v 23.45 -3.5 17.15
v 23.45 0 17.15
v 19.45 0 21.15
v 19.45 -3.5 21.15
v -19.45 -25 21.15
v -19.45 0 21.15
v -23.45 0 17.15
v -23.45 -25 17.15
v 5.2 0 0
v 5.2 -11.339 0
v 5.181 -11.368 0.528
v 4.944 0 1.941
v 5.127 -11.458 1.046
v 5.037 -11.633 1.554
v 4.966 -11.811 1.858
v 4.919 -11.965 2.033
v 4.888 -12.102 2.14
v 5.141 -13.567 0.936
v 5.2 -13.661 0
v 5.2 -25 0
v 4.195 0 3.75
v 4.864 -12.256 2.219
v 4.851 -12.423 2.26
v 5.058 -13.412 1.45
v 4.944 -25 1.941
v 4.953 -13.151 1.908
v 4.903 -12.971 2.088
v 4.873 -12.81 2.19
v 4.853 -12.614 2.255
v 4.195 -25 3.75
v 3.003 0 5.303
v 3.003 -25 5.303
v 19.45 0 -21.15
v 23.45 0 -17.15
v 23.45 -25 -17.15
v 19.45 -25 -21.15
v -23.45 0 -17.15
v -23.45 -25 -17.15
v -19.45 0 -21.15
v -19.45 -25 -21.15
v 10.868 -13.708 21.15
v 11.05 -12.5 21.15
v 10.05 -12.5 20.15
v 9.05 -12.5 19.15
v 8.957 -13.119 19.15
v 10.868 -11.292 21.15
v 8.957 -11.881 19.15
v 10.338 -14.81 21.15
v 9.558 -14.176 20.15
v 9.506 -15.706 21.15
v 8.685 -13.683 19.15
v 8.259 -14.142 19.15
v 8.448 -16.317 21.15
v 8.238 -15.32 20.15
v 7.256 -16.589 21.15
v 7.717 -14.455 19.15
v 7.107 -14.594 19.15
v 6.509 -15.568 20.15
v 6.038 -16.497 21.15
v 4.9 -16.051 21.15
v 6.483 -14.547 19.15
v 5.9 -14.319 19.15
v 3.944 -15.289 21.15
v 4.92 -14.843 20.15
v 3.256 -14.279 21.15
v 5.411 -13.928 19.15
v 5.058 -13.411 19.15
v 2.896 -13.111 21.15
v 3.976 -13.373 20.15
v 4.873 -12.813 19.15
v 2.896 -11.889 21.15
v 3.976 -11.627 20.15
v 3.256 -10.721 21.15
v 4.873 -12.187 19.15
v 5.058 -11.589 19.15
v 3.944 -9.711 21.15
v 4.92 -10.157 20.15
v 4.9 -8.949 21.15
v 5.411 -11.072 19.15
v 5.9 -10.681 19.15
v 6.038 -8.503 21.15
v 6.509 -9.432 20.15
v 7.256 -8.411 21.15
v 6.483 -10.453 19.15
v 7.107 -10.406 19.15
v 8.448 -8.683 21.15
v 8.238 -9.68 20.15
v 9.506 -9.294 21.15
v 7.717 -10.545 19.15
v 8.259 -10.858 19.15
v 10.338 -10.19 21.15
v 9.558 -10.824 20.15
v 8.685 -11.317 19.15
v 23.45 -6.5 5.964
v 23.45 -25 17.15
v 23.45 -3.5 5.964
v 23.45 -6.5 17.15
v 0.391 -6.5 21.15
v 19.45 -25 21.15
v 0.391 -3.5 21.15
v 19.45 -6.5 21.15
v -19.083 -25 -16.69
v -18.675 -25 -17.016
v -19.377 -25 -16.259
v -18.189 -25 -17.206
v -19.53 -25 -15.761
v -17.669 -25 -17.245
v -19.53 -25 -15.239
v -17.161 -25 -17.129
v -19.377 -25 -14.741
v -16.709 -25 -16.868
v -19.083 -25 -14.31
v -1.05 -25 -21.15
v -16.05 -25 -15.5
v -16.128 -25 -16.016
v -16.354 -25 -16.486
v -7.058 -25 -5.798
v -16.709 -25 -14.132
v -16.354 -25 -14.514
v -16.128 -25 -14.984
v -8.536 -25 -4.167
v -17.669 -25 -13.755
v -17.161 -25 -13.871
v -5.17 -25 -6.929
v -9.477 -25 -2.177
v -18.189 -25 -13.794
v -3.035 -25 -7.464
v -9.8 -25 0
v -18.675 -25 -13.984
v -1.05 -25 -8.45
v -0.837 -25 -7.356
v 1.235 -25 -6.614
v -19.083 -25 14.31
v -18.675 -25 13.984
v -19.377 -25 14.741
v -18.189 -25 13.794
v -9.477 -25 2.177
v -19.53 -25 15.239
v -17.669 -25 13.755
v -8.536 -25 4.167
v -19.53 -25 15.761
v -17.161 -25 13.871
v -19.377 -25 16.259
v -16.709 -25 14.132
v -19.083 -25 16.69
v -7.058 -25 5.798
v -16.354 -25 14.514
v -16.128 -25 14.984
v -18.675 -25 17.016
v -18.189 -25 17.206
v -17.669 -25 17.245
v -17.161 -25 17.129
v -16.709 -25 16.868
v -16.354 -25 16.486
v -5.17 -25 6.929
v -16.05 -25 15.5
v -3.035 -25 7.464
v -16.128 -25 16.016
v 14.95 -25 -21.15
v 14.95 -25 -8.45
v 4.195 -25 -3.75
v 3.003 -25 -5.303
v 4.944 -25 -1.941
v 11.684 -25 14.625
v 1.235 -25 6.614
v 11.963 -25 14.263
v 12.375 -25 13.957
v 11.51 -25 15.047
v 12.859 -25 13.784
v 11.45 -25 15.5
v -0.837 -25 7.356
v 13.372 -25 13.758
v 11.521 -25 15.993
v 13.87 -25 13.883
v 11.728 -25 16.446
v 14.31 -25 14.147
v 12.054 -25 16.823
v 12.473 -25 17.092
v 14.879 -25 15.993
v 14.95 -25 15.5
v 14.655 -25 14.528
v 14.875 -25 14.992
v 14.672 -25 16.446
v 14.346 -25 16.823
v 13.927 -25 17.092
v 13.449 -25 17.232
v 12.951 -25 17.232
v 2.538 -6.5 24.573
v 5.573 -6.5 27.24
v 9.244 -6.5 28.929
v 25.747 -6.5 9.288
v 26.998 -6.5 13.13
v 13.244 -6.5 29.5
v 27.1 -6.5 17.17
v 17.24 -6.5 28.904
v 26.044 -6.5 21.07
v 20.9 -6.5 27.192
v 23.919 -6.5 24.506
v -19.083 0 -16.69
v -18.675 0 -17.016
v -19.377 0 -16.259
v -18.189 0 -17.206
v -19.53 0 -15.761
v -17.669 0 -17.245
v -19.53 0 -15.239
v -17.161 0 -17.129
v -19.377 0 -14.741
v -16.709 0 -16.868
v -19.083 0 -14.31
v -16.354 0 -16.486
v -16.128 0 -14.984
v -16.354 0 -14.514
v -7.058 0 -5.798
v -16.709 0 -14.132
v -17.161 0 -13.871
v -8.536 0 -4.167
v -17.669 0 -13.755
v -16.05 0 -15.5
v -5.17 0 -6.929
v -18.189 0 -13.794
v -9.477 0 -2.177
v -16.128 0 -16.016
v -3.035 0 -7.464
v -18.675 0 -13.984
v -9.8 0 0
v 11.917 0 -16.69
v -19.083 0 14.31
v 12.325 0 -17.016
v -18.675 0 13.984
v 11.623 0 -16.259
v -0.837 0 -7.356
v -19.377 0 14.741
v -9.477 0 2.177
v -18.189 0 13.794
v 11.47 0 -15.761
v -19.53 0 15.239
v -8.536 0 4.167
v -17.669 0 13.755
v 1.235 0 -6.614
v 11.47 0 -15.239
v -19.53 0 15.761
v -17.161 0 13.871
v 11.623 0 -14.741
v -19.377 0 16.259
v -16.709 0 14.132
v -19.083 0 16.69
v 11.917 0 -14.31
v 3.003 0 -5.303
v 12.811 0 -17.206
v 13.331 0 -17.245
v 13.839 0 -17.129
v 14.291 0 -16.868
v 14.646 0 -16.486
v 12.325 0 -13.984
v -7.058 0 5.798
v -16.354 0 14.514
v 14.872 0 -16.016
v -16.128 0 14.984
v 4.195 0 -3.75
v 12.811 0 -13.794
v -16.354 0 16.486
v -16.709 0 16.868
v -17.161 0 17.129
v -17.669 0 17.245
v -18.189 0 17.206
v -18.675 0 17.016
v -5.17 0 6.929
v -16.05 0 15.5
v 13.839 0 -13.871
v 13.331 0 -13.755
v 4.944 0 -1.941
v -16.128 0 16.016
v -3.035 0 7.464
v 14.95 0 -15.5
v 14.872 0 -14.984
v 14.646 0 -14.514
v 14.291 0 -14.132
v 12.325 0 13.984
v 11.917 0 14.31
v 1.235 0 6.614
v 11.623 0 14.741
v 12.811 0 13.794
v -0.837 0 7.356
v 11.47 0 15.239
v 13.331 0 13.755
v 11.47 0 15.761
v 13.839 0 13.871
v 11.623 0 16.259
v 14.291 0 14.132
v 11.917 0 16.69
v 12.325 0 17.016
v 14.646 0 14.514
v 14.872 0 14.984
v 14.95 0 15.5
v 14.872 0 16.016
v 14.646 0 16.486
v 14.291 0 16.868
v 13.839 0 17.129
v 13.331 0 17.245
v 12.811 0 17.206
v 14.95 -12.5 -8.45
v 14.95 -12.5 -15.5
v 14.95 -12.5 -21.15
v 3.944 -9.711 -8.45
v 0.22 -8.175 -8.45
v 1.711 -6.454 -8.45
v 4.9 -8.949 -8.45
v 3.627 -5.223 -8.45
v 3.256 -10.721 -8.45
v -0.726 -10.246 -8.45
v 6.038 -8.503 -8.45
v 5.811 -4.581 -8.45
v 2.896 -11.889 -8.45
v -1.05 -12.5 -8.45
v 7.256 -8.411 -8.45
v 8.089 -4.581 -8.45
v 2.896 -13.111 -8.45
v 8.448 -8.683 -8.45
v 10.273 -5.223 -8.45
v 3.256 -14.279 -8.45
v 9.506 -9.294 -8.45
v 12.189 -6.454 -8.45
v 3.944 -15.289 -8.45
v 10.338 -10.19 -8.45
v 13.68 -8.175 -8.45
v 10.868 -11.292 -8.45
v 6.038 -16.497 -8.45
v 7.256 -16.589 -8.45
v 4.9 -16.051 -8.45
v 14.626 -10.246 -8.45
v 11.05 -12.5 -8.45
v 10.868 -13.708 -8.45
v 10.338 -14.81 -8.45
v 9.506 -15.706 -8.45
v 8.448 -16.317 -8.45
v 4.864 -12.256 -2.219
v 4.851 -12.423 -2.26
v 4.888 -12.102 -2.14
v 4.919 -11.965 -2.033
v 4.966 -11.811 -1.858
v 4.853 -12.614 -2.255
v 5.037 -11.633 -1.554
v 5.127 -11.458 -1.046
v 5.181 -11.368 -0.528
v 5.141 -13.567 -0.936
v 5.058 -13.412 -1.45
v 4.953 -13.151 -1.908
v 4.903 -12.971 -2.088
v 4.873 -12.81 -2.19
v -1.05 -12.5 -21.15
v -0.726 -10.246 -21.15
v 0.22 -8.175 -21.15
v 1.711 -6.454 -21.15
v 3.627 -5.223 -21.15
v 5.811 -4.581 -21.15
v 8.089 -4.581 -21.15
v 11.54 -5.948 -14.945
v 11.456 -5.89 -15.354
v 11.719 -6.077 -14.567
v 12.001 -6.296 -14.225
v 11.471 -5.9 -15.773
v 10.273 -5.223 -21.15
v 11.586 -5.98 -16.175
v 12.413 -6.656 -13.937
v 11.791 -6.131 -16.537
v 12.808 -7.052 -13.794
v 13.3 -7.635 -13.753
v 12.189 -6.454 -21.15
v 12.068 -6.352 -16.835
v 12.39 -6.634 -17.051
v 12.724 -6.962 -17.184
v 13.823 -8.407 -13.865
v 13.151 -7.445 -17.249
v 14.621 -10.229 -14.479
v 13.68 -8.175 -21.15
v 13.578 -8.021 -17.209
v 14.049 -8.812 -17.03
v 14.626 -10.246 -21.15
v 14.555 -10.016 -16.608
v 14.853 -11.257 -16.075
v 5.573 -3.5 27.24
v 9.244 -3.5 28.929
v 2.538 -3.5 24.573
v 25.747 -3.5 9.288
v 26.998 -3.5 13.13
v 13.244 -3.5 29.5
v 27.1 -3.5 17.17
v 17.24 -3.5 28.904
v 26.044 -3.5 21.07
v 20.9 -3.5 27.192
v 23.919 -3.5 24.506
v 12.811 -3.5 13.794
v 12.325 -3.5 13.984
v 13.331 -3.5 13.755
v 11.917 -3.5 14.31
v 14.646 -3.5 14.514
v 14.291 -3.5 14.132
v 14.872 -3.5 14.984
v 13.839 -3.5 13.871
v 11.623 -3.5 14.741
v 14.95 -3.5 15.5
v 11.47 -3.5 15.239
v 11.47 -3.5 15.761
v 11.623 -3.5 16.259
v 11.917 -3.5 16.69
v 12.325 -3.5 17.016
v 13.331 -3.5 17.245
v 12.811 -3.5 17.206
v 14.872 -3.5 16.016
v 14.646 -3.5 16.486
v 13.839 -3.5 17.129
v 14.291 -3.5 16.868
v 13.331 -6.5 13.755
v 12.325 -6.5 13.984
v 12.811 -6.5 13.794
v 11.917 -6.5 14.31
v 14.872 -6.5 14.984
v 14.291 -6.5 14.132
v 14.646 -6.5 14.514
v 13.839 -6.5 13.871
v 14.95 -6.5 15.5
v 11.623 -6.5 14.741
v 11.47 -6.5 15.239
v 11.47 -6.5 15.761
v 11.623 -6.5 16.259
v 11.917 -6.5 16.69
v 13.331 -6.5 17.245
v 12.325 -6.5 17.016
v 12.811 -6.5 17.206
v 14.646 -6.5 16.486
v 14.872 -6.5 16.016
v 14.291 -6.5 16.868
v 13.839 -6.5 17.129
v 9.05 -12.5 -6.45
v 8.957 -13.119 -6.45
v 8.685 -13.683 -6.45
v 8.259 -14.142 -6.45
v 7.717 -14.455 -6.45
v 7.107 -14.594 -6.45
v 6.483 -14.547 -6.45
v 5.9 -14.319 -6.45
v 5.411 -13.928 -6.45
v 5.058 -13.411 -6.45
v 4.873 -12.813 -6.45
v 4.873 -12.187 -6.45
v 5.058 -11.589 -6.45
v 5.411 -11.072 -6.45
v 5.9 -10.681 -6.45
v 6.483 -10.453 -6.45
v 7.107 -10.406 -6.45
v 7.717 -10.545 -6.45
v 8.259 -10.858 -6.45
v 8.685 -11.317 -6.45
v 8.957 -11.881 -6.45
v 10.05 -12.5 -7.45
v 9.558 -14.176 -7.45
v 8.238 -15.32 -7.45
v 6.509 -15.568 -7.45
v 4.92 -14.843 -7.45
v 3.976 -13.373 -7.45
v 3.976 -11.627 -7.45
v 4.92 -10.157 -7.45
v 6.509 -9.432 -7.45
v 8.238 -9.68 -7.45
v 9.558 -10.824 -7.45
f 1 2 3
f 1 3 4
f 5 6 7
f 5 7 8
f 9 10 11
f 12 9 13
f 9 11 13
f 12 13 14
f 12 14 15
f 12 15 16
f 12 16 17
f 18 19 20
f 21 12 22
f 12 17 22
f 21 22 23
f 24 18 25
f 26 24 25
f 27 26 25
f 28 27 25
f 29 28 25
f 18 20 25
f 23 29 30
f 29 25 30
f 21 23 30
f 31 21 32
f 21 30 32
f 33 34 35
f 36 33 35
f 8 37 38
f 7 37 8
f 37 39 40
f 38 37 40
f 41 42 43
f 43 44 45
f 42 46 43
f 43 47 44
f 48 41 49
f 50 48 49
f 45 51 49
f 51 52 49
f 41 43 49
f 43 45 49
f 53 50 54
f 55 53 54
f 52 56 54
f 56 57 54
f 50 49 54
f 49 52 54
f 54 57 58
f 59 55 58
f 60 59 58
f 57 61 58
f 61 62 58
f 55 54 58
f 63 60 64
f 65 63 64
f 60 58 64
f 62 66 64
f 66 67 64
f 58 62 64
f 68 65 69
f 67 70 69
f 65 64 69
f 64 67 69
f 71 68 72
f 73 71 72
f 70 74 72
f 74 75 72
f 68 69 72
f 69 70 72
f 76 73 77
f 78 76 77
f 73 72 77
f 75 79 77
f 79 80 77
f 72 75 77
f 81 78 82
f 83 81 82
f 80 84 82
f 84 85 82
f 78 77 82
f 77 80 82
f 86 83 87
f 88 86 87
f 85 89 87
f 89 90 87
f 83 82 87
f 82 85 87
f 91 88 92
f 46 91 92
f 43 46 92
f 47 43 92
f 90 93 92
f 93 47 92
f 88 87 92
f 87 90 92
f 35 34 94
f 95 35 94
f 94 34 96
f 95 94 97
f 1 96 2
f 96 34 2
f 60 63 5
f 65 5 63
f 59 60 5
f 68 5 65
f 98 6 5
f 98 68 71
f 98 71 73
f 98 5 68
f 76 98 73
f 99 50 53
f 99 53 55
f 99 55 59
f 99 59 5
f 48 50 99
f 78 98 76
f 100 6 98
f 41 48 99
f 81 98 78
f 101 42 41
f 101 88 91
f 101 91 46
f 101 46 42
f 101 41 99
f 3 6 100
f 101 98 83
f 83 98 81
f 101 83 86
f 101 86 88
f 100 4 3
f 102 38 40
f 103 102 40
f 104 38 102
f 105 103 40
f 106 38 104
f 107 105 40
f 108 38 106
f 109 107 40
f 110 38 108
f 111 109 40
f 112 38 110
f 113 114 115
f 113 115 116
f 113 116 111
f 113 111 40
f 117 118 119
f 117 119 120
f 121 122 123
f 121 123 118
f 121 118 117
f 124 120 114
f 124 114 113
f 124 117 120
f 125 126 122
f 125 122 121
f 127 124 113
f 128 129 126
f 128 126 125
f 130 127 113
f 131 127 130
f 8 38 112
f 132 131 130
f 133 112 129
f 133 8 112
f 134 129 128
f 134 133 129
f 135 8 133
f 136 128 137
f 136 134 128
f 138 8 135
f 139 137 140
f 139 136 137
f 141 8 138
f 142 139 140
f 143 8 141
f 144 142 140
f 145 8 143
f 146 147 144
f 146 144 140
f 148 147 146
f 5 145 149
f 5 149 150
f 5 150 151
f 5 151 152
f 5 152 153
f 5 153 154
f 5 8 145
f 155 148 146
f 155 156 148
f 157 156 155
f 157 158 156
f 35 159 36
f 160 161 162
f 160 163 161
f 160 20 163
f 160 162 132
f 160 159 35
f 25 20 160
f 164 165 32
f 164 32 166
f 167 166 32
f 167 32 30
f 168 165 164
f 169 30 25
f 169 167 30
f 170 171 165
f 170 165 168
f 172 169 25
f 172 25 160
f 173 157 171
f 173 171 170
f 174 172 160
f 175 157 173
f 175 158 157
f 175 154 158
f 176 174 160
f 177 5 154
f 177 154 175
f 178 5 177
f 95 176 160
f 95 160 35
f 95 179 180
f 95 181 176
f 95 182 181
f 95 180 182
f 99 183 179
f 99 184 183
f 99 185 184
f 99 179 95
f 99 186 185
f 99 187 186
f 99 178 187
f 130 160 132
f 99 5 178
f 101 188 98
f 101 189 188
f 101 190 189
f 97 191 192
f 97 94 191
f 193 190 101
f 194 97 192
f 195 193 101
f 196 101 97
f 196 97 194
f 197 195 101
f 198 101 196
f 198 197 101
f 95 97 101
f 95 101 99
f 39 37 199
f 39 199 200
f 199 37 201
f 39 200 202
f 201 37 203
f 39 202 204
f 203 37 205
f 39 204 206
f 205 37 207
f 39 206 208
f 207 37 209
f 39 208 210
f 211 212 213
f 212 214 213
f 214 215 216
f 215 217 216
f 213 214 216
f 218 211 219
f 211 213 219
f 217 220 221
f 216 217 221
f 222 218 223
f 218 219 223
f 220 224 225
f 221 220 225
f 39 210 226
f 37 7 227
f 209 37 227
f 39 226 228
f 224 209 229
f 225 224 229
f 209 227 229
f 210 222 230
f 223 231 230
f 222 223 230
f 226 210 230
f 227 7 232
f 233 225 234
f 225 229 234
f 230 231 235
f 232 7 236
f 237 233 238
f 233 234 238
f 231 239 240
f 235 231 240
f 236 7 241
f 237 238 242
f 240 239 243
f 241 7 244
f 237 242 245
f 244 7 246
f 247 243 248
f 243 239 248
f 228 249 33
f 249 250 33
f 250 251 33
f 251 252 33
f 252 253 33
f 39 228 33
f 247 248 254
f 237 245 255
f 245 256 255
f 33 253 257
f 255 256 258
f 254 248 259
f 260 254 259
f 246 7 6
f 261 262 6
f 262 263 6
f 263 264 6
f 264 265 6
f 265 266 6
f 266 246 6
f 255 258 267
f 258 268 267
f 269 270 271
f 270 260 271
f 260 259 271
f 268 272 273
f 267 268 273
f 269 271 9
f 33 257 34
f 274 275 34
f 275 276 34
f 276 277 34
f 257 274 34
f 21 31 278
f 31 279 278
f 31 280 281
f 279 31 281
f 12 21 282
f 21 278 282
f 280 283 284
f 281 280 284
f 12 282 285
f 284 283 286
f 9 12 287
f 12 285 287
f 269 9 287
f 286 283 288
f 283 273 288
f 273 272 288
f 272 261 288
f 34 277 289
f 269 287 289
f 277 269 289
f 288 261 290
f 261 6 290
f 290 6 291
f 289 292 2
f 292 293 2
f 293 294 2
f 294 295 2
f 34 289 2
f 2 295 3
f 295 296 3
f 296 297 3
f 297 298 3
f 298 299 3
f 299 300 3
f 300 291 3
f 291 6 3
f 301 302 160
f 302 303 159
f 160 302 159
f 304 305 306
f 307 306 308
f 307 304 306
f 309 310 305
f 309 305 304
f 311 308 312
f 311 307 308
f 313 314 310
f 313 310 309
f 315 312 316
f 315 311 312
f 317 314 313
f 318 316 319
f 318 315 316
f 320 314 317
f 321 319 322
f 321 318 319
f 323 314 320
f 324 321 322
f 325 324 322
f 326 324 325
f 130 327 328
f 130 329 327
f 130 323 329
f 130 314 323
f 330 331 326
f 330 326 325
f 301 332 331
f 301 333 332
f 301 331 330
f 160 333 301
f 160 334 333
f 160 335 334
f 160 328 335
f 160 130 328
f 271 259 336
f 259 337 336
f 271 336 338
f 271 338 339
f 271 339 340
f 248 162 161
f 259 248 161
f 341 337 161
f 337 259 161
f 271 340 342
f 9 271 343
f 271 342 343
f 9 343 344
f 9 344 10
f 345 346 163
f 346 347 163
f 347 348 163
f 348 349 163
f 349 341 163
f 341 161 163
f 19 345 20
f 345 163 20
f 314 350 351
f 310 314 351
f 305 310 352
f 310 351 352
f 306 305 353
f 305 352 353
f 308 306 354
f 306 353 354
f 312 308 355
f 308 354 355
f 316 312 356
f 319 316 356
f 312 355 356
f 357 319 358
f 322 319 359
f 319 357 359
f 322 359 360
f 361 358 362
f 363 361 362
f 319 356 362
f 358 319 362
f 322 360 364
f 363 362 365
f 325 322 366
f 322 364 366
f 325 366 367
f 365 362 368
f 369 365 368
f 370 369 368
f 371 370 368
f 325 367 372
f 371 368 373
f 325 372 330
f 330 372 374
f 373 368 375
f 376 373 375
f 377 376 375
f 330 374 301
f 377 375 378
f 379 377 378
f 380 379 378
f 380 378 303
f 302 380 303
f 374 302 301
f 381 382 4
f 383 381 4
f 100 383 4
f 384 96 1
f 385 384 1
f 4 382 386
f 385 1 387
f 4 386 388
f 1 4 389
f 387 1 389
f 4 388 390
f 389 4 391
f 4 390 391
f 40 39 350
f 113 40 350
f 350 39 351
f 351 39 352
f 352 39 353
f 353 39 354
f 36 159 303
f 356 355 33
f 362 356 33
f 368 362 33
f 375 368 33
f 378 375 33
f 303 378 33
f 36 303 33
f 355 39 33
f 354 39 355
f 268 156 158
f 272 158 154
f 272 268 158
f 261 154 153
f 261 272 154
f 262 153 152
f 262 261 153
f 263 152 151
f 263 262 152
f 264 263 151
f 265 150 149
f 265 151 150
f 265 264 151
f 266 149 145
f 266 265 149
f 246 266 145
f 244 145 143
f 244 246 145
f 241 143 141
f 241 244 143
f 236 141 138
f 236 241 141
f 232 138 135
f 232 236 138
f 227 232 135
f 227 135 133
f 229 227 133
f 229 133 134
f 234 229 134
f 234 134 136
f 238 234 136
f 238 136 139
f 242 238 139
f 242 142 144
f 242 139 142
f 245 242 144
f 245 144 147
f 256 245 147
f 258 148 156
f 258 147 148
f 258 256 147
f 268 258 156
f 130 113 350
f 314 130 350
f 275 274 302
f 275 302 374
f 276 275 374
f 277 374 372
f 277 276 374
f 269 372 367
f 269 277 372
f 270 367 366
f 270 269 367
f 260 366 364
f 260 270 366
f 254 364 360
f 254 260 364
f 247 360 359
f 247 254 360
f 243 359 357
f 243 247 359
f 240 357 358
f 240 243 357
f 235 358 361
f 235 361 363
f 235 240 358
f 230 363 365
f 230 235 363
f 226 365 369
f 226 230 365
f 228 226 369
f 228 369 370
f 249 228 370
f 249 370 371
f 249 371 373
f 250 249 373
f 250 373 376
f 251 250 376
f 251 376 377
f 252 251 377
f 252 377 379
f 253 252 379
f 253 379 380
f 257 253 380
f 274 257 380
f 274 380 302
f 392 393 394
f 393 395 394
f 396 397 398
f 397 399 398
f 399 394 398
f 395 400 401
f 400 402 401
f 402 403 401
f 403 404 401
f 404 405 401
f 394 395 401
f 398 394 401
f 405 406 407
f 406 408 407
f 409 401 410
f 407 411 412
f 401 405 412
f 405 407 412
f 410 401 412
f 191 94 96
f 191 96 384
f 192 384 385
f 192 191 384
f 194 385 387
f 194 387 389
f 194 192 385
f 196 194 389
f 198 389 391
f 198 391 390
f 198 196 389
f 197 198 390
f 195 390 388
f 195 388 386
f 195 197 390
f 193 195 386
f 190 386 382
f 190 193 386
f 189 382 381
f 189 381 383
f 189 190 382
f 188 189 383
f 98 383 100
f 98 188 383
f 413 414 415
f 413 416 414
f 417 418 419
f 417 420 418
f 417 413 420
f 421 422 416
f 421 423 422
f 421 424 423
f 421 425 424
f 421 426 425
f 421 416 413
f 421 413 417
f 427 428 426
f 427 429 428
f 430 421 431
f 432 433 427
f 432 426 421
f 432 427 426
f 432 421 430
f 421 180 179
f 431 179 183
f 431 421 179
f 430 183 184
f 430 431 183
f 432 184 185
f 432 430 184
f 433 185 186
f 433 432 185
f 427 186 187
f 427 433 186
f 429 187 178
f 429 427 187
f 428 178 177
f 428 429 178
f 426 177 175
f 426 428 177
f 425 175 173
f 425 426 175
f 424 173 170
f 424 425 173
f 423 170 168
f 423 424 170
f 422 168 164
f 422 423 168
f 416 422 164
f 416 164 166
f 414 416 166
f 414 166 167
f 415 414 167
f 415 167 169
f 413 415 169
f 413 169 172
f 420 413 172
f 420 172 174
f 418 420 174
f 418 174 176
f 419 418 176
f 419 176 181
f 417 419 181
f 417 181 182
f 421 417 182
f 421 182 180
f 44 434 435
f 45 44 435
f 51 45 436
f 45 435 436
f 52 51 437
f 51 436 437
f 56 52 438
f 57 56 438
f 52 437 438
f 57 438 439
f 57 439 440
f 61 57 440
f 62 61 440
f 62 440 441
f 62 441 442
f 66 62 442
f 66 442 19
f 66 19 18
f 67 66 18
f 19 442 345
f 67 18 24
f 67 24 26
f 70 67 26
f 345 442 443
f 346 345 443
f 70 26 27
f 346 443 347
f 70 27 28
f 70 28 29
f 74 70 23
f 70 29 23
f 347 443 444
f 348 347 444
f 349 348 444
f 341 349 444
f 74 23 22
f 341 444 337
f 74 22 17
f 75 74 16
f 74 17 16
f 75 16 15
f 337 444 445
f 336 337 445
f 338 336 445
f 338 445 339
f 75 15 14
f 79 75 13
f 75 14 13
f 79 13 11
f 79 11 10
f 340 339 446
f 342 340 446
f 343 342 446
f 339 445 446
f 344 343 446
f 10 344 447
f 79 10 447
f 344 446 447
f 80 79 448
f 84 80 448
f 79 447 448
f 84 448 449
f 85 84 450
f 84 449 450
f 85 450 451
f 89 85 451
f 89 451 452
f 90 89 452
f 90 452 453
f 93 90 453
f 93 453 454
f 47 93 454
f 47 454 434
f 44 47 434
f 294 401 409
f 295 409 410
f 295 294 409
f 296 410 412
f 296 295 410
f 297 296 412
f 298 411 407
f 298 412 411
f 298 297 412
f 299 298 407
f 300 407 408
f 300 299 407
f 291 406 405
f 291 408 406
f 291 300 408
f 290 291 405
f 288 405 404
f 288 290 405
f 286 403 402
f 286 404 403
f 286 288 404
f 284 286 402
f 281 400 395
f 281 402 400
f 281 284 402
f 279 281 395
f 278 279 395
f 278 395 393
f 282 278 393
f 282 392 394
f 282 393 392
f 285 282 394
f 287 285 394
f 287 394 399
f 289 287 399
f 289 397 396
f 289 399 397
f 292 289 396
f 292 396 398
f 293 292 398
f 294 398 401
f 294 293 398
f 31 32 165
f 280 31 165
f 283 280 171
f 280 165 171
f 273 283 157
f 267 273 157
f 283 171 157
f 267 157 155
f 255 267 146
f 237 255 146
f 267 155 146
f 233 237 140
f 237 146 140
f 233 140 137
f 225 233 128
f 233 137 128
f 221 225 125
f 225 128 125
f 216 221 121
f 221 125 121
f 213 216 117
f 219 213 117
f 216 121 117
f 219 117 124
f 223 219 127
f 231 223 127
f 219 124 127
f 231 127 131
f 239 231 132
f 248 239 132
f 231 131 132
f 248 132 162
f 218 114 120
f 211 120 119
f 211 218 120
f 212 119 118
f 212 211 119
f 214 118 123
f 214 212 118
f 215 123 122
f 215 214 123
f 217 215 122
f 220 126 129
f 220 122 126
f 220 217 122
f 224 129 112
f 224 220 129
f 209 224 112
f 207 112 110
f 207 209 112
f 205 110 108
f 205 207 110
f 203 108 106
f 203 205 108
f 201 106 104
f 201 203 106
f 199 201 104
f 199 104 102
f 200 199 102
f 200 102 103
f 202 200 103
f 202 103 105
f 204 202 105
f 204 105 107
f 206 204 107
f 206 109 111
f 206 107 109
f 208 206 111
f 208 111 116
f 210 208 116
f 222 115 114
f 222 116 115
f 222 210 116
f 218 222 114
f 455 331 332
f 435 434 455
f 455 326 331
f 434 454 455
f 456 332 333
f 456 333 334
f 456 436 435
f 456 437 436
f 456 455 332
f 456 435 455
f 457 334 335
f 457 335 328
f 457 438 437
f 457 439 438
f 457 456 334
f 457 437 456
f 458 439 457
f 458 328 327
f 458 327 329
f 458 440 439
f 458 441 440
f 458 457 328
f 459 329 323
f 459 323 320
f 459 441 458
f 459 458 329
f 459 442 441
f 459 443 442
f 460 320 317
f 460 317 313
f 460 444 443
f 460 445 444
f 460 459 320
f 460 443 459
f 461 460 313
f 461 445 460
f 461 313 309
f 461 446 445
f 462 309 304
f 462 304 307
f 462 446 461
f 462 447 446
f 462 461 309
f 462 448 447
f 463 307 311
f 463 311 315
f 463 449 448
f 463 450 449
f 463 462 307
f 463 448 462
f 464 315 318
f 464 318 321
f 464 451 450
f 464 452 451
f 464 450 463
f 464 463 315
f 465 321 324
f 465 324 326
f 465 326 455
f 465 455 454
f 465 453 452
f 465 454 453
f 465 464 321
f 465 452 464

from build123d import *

# Parameters (mm, degrees)
F0_W      = 46.9
F0_H      = 42.3
F0_R      = 1.75
F1_DEPTH  = 25
F2_SIZE   = 4
F4_DEPTH  = 12.7
F5_R      = 2.1
F6_DEPTH  = 29.601
F7_SIZE   = 2
F9_DEPTH  = 25.0010001
F11_R     = 14
F12_DEPTH = 1.5


# Not quite as in the source:
# - a feature names something its author has since deleted; it is built from what else it names


with BuildPart() as f1:
    # F0 (on Front) → F1 (new body)
    with BuildSketch(Plane.XZ):
        Rectangle(F0_W, F0_H)
        with Locations((-17.8, -15.5)):
            Circle(F0_R, mode=Mode.SUBTRACT)
        with Locations((13.2, -15.5)):
            Circle(F0_R, mode=Mode.SUBTRACT)
        with Locations((-17.8, 15.5)):
            Circle(F0_R, mode=Mode.SUBTRACT)
        with Locations((13.2, 15.5)):
            Circle(F0_R, mode=Mode.SUBTRACT)
    extrude(amount=F1_DEPTH)

    # F2
    f2_edges = [f1.edges().sort_by_distance(p)[0] for p in [
        (-23.45, -12.5, 21.15),
        (23.45, -12.5, 21.15),
        (23.45, -12.5, -21.15),
        (-23.45, -12.5, -21.15),
    ]]
    chamfer(f2_edges, length=F2_SIZE)

    # F3 (on face) → F4 (cut)
    with BuildSketch(Plane(origin=(0, 0, -21.15), x_dir=(1, 0, 0), z_dir=(0, 0, -1))):
        with BuildLine():
            Line((6.95, 12.5), (14.95, 12.5))
            ThreePointArc((14.95, 12.5), (6.95, 20.5), (-1.05, 12.5))
            Line((-1.05, 12.5), (6.95, 12.5))
        make_face()
        with BuildLine():
            ThreePointArc((-1.05, 12.5), (6.95, 4.5), (14.95, 12.5))
            Line((14.95, 12.5), (6.95, 12.5))
            Line((6.95, 12.5), (-1.05, 12.5))
        make_face()
        with BuildLine():
            ThreePointArc((-1.05, 12.5), (6.95, 20.5), (14.95, 12.5))
            Line((14.95, 12.5), (14.95, 25))
            Line((14.95, 25), (-1.05, 25))
            Line((-1.05, 25), (-1.05, 12.5))
        make_face()
    extrude(amount=-F4_DEPTH, mode=Mode.SUBTRACT)

    # F5 (on face) → F6 (cut, through all)
    with BuildSketch(Plane(origin=(0, 0, -8.45), x_dir=(1, 0, 0), z_dir=(0, 0, -1))):
        with Locations((6.95, 12.5)):
            Circle(F5_R)
    extrude(amount=-F6_DEPTH, mode=Mode.SUBTRACT)

    # F7
    f7_edges = [f1.edges().sort_by_distance(p)[0] for p in [
        (4.85, -12.5, -8.45),
        (4.85, -12.5, 21.15),
    ]]
    chamfer(f7_edges, length=F7_SIZE)

    # F8 (on face) → F9 (cut, through all)
    with BuildSketch(Plane.XZ.offset(25)):
        with BuildLine():
            Line((-16.05, 15.5), (-17.8, 15.5))
            Line((-17.8, 15.5), (-16.5625631329, 14.2625631329))
            ThreePointArc((-16.5625631329, 14.2625631329), (-16.1832108181, 14.8303039934), (-16.05, 15.5))
        make_face()
        with BuildLine():
            Line((13.2, 15.5), (11.45, 15.5))
            ThreePointArc((11.45, 15.5), (11.5832108181, 14.8303039934), (11.9625631329, 14.2625631329))
            Line((11.9625631329, 14.2625631329), (13.2, 15.5))
        make_face()
        with BuildLine():
            ThreePointArc((-16.05, -15.5), (-16.1832108181, -14.8303039934), (-16.5625631329, -14.2625631329))
            Line((-16.5625631329, -14.2625631329), (-17.8, -15.5))
            Line((-17.8, -15.5), (-16.05, -15.5))
        make_face()
        with BuildLine():
            Line((3.0033008589, 5.3033008589), (-2.3, 0))
            Line((-2.3, 0), (3.0033008589, -5.3033008589))
            ThreePointArc((3.0033008589, -5.3033008589), (4.6290964938, -2.8701257427), (5.2, 0))
            ThreePointArc((5.2, 0), (4.6290964938, 2.8701257427), (3.0033008589, 5.3033008589))
        make_face()
        with BuildLine():
            ThreePointArc((3.0033008589, 5.3033008589), (-2.3, 7.5), (-7.6033008589, 5.3033008589))
            Line((-7.6033008589, 5.3033008589), (-2.3, 0))
            Line((-2.3, 0), (3.0033008589, 5.3033008589))
        make_face()
        with BuildLine():
            Line((-2.3, 0), (-7.6033008589, 5.3033008589))
            ThreePointArc((-7.6033008589, 5.3033008589), (-9.8, 0), (-7.6033008589, -5.3033008589))
            Line((-7.6033008589, -5.3033008589), (-2.3, 0))
        make_face()
        with BuildLine():
            Line((3.0033008589, -5.3033008589), (-2.3, 0))
            Line((-2.3, 0), (-7.6033008589, -5.3033008589))
            ThreePointArc((-7.6033008589, -5.3033008589), (-2.3, -7.5), (3.0033008589, -5.3033008589))
        make_face()
    extrude(amount=-F9_DEPTH, mode=Mode.SUBTRACT)

    # F11 (on offset) → F12 (join, symmetric)
    with BuildSketch(Plane.XZ.offset(5)):
        with Locations((13.2, 15.5)):
            Circle(F11_R)
    extrude(amount=F12_DEPTH, both=True)


solid = f1.part
